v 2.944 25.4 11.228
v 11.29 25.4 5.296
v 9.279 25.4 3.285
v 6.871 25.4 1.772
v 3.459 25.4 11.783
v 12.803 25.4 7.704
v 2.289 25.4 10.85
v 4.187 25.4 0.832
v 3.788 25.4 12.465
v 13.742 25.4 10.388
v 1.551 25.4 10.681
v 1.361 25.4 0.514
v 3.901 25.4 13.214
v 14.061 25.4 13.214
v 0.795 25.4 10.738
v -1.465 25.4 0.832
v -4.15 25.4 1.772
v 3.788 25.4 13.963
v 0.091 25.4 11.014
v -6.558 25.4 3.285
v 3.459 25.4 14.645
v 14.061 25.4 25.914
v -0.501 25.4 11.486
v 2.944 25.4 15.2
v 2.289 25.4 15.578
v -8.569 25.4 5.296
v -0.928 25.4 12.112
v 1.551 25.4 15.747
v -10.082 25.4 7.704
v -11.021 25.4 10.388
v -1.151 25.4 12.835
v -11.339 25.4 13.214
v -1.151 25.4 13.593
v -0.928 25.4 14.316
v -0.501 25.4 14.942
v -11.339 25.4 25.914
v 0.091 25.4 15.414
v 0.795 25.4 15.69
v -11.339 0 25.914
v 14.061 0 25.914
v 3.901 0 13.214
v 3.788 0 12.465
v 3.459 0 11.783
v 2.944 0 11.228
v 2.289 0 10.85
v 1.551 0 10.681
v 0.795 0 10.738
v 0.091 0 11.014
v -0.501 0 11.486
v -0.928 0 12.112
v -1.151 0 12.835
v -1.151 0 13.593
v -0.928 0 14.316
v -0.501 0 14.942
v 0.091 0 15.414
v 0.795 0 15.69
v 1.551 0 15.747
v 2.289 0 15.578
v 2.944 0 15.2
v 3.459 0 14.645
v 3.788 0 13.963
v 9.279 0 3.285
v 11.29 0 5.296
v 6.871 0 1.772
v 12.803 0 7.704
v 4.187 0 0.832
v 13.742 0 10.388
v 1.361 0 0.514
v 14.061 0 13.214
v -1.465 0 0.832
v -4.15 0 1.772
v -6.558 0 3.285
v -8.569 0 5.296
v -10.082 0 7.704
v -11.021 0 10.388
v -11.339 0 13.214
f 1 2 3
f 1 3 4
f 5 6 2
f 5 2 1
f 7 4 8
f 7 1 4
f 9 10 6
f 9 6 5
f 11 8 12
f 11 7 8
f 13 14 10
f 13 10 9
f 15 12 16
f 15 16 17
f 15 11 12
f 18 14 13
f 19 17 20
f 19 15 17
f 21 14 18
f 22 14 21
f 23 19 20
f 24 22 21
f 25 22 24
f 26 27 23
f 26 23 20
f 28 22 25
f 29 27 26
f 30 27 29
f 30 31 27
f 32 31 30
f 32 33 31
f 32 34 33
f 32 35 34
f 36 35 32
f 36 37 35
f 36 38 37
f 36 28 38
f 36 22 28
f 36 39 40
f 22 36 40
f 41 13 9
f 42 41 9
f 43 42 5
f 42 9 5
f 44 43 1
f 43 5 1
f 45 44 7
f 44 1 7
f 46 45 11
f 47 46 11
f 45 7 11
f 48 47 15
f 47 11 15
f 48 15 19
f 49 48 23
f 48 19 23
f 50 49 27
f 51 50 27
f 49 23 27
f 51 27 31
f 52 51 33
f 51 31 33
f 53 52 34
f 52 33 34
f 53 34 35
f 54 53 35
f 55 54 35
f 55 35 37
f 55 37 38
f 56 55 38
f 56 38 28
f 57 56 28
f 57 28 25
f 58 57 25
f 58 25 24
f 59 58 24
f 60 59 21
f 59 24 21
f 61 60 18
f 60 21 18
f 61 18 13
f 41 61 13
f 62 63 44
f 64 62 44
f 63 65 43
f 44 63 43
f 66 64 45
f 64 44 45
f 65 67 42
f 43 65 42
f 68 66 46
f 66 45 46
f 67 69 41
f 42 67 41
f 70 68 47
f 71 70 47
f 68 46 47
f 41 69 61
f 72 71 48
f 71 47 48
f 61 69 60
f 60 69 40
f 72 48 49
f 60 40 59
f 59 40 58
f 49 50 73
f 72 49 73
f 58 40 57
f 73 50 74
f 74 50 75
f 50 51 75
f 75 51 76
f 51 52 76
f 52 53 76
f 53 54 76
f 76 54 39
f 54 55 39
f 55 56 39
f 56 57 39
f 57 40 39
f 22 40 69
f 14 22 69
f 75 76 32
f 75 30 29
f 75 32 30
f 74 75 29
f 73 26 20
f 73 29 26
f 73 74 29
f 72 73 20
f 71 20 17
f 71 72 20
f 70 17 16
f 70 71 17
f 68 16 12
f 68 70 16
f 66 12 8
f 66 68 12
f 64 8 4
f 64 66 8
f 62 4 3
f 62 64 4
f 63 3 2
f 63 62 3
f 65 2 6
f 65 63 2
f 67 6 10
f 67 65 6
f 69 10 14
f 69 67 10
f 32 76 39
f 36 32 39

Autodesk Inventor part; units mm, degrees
ref_plane "YZ Plane" through (0, 0, 0) normal (1, 0, 0) x (0, 1, 0)
ref_plane "XZ Plane" through (0, 0, 0) normal (0, 1, 0) x (-1, 0, 0)
ref_plane "XY Plane" through (0, 0, 0) normal (0, 0, 1) x (1, 0, 0)
sketch "Sketch1" plane through (0, 0, 0) normal (0, 1, 0) x (-1, 0, 0)
  line L0 (11.3393, 25.914) -> (-14.0607, 25.914)
  line L1 (-14.0607, 25.914) -> (-14.0607, 13.214)
  line L2 (11.3393, 13.214) -> (11.3393, 25.914)
  arc A0 (-14.0607, 13.214) -> (11.3393, 13.214) centre (-1.3607, 13.214) ccw
  point P0 (0, 0)
  dimension "d1" = 25.4
  dimension "d2" = 25.4
  dimension "d3" = 12.7
  dimension "d4" = 12.7
extrude "Extrusion1" add sketch "Sketch1" along normal blind 25.4
sketch "Sketch2" plane through (0, 25.4, 0) normal (0, 1, 0) x (1, 0, 0)
  arc A0 (14.0607, -13.214) -> (-11.3393, -13.214) centre (1.3607, -13.214) ccw projected
  circle A1 centre (1.3607, -13.214) radius 2.54
  point P0 (0, 0)
  dimension "d7" = 5.08
extrude "Extrusion2" cut sketch "Sketch2" against normal blind 25.4
properties part number "Hinge"
